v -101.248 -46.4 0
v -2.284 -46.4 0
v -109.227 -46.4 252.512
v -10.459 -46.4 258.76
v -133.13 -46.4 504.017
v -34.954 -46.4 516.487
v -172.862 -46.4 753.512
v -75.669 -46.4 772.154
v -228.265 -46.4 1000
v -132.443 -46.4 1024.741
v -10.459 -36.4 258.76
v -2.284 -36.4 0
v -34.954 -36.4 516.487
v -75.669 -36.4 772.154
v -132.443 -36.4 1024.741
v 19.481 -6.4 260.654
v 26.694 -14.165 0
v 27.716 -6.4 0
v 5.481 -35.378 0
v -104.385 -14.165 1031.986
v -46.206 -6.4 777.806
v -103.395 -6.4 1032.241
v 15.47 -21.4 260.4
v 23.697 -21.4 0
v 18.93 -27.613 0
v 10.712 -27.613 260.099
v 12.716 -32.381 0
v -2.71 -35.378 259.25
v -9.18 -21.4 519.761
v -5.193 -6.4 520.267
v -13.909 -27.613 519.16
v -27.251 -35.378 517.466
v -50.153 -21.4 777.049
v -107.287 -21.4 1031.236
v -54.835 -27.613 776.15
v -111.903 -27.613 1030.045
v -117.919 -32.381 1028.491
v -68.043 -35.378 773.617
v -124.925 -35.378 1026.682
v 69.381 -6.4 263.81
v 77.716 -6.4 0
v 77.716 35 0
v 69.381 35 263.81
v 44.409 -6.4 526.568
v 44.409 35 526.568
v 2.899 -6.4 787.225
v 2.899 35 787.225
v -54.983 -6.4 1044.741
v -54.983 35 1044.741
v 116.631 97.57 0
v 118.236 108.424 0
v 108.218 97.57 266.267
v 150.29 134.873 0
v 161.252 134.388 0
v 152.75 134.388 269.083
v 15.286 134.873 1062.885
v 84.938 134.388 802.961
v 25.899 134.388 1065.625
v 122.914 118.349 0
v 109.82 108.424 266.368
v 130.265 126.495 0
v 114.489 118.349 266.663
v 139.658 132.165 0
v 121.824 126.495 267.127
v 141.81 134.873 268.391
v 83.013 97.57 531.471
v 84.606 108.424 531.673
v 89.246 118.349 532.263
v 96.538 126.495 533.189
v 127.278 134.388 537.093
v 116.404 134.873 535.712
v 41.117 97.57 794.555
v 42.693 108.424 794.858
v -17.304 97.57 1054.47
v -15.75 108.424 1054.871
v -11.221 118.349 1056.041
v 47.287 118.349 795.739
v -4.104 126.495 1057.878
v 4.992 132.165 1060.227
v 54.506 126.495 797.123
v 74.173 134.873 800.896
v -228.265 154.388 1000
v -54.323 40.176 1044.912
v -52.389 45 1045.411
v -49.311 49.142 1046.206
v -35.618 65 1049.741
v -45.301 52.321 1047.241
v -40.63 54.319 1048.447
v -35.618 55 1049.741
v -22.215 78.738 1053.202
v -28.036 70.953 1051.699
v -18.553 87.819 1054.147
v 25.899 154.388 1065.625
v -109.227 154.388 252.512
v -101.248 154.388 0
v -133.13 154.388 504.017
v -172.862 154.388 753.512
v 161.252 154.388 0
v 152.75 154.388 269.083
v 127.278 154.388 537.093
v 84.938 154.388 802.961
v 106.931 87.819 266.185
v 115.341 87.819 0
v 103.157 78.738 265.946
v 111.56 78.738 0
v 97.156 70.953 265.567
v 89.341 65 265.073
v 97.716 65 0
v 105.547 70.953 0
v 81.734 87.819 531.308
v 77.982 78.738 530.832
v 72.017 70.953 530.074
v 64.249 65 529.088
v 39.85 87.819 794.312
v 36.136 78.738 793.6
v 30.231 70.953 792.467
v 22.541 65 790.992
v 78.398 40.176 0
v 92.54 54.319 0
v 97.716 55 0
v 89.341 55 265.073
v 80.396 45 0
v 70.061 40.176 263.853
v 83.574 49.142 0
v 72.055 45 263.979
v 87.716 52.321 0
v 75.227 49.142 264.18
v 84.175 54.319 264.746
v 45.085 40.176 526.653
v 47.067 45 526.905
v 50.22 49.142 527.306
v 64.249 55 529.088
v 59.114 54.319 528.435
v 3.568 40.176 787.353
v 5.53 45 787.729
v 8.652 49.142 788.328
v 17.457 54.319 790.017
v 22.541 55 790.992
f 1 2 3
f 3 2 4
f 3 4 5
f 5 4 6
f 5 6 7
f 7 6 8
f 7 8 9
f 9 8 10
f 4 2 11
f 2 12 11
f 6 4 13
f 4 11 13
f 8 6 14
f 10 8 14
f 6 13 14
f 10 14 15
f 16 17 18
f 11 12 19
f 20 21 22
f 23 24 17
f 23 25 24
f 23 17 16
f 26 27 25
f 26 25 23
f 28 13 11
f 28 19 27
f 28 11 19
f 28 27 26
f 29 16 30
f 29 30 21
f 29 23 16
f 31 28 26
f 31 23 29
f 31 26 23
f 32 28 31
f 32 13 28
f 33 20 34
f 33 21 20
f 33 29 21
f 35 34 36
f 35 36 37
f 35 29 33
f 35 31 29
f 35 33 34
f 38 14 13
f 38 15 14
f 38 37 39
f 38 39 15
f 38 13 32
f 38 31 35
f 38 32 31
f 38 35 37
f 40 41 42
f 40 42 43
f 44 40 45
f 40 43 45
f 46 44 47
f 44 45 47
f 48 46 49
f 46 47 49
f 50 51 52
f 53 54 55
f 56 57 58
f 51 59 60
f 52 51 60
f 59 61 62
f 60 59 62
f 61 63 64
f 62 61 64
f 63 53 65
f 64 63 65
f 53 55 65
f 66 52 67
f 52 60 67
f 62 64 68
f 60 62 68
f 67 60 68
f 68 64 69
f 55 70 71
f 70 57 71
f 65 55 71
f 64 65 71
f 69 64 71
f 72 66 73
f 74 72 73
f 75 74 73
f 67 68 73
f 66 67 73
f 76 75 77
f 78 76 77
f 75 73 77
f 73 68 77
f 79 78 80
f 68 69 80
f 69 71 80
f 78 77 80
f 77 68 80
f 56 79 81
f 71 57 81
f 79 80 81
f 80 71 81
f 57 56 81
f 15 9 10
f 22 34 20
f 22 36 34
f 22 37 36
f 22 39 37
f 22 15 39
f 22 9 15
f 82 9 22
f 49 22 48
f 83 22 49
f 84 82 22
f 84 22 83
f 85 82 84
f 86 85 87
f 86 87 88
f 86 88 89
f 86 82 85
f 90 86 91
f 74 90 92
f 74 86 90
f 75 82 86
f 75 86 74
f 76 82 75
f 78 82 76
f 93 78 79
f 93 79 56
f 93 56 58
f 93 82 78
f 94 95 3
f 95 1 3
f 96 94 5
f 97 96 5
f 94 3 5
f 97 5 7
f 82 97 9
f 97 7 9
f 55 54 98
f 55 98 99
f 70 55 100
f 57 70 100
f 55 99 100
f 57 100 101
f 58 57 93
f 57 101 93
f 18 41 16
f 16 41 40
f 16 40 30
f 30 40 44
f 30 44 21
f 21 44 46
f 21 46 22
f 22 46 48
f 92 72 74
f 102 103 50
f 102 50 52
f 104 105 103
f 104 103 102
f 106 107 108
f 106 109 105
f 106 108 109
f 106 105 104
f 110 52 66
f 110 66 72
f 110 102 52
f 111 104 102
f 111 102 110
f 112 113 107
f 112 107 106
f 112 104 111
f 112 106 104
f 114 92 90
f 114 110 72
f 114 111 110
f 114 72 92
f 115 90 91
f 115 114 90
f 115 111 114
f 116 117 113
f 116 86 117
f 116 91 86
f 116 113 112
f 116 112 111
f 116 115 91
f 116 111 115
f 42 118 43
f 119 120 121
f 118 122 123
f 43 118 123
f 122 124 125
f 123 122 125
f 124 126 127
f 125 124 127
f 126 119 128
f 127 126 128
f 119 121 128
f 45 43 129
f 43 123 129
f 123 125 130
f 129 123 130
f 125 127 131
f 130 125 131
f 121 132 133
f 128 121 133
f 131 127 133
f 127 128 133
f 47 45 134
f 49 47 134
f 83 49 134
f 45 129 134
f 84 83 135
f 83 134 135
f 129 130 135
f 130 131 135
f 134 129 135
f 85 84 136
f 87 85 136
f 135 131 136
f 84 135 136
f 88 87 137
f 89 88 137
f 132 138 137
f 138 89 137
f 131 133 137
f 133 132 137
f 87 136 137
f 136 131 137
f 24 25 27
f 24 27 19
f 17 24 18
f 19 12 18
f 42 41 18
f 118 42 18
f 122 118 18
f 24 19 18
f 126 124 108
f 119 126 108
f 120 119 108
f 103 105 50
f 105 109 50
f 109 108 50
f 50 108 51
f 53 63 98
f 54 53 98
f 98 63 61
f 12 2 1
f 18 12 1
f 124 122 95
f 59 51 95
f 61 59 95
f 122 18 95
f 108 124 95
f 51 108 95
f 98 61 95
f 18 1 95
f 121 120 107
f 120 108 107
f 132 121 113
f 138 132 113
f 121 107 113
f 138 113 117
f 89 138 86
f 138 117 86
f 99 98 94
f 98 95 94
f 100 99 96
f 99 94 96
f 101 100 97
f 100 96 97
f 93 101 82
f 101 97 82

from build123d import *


with BuildPart() as f3:
    # F3: sweep along a path in F2
    with BuildLine(Plane.XZ.offset(46.4)) as f3_path:
        ThreePointArc((-101.248391782, 0), (-133.1296067133, 504.0171699309), (-228.2650455746, 1000))
    # F0 (on Top) → F3 (sweep)
    with BuildSketch(Plane.XY):
        with BuildLine():
            Line((161.251608218, 154.3882413845), (-101.248391782, 154.3882413845))
            Line((-101.248391782, 154.3882413845), (-101.248391782, -46.4))
            Line((-101.248391782, -46.4), (-2.2835230583, -46.4))
            Line((-2.2835230583, -46.4), (-2.2835230583, -36.4))
            ThreePointArc((-2.2835230583, -36.4), (18.9296803773, -27.6132034356), (27.7164769417, -6.4))
            Line((27.7164769417, -6.4), (77.7164769417, -6.4))
            Line((77.7164769417, -6.4), (77.7164769417, 35))
            ThreePointArc((77.7164769417, 35), (83.574341318, 49.1421356237), (97.7164769417, 55))
            Line((97.7164769417, 55), (97.7164769417, 65))
            ThreePointArc((97.7164769417, 65), (111.5595193417, 78.7383139253), (116.631133907, 97.5704624512))
            ThreePointArc((116.631133907, 97.5704624512), (130.2645022496, 126.4950867933), (161.251608218, 134.3882413845))
            Line((161.251608218, 134.3882413845), (161.251608218, 154.3882413845))
        make_face()
    sweep(path=f3_path.line)


solid = f3.part
